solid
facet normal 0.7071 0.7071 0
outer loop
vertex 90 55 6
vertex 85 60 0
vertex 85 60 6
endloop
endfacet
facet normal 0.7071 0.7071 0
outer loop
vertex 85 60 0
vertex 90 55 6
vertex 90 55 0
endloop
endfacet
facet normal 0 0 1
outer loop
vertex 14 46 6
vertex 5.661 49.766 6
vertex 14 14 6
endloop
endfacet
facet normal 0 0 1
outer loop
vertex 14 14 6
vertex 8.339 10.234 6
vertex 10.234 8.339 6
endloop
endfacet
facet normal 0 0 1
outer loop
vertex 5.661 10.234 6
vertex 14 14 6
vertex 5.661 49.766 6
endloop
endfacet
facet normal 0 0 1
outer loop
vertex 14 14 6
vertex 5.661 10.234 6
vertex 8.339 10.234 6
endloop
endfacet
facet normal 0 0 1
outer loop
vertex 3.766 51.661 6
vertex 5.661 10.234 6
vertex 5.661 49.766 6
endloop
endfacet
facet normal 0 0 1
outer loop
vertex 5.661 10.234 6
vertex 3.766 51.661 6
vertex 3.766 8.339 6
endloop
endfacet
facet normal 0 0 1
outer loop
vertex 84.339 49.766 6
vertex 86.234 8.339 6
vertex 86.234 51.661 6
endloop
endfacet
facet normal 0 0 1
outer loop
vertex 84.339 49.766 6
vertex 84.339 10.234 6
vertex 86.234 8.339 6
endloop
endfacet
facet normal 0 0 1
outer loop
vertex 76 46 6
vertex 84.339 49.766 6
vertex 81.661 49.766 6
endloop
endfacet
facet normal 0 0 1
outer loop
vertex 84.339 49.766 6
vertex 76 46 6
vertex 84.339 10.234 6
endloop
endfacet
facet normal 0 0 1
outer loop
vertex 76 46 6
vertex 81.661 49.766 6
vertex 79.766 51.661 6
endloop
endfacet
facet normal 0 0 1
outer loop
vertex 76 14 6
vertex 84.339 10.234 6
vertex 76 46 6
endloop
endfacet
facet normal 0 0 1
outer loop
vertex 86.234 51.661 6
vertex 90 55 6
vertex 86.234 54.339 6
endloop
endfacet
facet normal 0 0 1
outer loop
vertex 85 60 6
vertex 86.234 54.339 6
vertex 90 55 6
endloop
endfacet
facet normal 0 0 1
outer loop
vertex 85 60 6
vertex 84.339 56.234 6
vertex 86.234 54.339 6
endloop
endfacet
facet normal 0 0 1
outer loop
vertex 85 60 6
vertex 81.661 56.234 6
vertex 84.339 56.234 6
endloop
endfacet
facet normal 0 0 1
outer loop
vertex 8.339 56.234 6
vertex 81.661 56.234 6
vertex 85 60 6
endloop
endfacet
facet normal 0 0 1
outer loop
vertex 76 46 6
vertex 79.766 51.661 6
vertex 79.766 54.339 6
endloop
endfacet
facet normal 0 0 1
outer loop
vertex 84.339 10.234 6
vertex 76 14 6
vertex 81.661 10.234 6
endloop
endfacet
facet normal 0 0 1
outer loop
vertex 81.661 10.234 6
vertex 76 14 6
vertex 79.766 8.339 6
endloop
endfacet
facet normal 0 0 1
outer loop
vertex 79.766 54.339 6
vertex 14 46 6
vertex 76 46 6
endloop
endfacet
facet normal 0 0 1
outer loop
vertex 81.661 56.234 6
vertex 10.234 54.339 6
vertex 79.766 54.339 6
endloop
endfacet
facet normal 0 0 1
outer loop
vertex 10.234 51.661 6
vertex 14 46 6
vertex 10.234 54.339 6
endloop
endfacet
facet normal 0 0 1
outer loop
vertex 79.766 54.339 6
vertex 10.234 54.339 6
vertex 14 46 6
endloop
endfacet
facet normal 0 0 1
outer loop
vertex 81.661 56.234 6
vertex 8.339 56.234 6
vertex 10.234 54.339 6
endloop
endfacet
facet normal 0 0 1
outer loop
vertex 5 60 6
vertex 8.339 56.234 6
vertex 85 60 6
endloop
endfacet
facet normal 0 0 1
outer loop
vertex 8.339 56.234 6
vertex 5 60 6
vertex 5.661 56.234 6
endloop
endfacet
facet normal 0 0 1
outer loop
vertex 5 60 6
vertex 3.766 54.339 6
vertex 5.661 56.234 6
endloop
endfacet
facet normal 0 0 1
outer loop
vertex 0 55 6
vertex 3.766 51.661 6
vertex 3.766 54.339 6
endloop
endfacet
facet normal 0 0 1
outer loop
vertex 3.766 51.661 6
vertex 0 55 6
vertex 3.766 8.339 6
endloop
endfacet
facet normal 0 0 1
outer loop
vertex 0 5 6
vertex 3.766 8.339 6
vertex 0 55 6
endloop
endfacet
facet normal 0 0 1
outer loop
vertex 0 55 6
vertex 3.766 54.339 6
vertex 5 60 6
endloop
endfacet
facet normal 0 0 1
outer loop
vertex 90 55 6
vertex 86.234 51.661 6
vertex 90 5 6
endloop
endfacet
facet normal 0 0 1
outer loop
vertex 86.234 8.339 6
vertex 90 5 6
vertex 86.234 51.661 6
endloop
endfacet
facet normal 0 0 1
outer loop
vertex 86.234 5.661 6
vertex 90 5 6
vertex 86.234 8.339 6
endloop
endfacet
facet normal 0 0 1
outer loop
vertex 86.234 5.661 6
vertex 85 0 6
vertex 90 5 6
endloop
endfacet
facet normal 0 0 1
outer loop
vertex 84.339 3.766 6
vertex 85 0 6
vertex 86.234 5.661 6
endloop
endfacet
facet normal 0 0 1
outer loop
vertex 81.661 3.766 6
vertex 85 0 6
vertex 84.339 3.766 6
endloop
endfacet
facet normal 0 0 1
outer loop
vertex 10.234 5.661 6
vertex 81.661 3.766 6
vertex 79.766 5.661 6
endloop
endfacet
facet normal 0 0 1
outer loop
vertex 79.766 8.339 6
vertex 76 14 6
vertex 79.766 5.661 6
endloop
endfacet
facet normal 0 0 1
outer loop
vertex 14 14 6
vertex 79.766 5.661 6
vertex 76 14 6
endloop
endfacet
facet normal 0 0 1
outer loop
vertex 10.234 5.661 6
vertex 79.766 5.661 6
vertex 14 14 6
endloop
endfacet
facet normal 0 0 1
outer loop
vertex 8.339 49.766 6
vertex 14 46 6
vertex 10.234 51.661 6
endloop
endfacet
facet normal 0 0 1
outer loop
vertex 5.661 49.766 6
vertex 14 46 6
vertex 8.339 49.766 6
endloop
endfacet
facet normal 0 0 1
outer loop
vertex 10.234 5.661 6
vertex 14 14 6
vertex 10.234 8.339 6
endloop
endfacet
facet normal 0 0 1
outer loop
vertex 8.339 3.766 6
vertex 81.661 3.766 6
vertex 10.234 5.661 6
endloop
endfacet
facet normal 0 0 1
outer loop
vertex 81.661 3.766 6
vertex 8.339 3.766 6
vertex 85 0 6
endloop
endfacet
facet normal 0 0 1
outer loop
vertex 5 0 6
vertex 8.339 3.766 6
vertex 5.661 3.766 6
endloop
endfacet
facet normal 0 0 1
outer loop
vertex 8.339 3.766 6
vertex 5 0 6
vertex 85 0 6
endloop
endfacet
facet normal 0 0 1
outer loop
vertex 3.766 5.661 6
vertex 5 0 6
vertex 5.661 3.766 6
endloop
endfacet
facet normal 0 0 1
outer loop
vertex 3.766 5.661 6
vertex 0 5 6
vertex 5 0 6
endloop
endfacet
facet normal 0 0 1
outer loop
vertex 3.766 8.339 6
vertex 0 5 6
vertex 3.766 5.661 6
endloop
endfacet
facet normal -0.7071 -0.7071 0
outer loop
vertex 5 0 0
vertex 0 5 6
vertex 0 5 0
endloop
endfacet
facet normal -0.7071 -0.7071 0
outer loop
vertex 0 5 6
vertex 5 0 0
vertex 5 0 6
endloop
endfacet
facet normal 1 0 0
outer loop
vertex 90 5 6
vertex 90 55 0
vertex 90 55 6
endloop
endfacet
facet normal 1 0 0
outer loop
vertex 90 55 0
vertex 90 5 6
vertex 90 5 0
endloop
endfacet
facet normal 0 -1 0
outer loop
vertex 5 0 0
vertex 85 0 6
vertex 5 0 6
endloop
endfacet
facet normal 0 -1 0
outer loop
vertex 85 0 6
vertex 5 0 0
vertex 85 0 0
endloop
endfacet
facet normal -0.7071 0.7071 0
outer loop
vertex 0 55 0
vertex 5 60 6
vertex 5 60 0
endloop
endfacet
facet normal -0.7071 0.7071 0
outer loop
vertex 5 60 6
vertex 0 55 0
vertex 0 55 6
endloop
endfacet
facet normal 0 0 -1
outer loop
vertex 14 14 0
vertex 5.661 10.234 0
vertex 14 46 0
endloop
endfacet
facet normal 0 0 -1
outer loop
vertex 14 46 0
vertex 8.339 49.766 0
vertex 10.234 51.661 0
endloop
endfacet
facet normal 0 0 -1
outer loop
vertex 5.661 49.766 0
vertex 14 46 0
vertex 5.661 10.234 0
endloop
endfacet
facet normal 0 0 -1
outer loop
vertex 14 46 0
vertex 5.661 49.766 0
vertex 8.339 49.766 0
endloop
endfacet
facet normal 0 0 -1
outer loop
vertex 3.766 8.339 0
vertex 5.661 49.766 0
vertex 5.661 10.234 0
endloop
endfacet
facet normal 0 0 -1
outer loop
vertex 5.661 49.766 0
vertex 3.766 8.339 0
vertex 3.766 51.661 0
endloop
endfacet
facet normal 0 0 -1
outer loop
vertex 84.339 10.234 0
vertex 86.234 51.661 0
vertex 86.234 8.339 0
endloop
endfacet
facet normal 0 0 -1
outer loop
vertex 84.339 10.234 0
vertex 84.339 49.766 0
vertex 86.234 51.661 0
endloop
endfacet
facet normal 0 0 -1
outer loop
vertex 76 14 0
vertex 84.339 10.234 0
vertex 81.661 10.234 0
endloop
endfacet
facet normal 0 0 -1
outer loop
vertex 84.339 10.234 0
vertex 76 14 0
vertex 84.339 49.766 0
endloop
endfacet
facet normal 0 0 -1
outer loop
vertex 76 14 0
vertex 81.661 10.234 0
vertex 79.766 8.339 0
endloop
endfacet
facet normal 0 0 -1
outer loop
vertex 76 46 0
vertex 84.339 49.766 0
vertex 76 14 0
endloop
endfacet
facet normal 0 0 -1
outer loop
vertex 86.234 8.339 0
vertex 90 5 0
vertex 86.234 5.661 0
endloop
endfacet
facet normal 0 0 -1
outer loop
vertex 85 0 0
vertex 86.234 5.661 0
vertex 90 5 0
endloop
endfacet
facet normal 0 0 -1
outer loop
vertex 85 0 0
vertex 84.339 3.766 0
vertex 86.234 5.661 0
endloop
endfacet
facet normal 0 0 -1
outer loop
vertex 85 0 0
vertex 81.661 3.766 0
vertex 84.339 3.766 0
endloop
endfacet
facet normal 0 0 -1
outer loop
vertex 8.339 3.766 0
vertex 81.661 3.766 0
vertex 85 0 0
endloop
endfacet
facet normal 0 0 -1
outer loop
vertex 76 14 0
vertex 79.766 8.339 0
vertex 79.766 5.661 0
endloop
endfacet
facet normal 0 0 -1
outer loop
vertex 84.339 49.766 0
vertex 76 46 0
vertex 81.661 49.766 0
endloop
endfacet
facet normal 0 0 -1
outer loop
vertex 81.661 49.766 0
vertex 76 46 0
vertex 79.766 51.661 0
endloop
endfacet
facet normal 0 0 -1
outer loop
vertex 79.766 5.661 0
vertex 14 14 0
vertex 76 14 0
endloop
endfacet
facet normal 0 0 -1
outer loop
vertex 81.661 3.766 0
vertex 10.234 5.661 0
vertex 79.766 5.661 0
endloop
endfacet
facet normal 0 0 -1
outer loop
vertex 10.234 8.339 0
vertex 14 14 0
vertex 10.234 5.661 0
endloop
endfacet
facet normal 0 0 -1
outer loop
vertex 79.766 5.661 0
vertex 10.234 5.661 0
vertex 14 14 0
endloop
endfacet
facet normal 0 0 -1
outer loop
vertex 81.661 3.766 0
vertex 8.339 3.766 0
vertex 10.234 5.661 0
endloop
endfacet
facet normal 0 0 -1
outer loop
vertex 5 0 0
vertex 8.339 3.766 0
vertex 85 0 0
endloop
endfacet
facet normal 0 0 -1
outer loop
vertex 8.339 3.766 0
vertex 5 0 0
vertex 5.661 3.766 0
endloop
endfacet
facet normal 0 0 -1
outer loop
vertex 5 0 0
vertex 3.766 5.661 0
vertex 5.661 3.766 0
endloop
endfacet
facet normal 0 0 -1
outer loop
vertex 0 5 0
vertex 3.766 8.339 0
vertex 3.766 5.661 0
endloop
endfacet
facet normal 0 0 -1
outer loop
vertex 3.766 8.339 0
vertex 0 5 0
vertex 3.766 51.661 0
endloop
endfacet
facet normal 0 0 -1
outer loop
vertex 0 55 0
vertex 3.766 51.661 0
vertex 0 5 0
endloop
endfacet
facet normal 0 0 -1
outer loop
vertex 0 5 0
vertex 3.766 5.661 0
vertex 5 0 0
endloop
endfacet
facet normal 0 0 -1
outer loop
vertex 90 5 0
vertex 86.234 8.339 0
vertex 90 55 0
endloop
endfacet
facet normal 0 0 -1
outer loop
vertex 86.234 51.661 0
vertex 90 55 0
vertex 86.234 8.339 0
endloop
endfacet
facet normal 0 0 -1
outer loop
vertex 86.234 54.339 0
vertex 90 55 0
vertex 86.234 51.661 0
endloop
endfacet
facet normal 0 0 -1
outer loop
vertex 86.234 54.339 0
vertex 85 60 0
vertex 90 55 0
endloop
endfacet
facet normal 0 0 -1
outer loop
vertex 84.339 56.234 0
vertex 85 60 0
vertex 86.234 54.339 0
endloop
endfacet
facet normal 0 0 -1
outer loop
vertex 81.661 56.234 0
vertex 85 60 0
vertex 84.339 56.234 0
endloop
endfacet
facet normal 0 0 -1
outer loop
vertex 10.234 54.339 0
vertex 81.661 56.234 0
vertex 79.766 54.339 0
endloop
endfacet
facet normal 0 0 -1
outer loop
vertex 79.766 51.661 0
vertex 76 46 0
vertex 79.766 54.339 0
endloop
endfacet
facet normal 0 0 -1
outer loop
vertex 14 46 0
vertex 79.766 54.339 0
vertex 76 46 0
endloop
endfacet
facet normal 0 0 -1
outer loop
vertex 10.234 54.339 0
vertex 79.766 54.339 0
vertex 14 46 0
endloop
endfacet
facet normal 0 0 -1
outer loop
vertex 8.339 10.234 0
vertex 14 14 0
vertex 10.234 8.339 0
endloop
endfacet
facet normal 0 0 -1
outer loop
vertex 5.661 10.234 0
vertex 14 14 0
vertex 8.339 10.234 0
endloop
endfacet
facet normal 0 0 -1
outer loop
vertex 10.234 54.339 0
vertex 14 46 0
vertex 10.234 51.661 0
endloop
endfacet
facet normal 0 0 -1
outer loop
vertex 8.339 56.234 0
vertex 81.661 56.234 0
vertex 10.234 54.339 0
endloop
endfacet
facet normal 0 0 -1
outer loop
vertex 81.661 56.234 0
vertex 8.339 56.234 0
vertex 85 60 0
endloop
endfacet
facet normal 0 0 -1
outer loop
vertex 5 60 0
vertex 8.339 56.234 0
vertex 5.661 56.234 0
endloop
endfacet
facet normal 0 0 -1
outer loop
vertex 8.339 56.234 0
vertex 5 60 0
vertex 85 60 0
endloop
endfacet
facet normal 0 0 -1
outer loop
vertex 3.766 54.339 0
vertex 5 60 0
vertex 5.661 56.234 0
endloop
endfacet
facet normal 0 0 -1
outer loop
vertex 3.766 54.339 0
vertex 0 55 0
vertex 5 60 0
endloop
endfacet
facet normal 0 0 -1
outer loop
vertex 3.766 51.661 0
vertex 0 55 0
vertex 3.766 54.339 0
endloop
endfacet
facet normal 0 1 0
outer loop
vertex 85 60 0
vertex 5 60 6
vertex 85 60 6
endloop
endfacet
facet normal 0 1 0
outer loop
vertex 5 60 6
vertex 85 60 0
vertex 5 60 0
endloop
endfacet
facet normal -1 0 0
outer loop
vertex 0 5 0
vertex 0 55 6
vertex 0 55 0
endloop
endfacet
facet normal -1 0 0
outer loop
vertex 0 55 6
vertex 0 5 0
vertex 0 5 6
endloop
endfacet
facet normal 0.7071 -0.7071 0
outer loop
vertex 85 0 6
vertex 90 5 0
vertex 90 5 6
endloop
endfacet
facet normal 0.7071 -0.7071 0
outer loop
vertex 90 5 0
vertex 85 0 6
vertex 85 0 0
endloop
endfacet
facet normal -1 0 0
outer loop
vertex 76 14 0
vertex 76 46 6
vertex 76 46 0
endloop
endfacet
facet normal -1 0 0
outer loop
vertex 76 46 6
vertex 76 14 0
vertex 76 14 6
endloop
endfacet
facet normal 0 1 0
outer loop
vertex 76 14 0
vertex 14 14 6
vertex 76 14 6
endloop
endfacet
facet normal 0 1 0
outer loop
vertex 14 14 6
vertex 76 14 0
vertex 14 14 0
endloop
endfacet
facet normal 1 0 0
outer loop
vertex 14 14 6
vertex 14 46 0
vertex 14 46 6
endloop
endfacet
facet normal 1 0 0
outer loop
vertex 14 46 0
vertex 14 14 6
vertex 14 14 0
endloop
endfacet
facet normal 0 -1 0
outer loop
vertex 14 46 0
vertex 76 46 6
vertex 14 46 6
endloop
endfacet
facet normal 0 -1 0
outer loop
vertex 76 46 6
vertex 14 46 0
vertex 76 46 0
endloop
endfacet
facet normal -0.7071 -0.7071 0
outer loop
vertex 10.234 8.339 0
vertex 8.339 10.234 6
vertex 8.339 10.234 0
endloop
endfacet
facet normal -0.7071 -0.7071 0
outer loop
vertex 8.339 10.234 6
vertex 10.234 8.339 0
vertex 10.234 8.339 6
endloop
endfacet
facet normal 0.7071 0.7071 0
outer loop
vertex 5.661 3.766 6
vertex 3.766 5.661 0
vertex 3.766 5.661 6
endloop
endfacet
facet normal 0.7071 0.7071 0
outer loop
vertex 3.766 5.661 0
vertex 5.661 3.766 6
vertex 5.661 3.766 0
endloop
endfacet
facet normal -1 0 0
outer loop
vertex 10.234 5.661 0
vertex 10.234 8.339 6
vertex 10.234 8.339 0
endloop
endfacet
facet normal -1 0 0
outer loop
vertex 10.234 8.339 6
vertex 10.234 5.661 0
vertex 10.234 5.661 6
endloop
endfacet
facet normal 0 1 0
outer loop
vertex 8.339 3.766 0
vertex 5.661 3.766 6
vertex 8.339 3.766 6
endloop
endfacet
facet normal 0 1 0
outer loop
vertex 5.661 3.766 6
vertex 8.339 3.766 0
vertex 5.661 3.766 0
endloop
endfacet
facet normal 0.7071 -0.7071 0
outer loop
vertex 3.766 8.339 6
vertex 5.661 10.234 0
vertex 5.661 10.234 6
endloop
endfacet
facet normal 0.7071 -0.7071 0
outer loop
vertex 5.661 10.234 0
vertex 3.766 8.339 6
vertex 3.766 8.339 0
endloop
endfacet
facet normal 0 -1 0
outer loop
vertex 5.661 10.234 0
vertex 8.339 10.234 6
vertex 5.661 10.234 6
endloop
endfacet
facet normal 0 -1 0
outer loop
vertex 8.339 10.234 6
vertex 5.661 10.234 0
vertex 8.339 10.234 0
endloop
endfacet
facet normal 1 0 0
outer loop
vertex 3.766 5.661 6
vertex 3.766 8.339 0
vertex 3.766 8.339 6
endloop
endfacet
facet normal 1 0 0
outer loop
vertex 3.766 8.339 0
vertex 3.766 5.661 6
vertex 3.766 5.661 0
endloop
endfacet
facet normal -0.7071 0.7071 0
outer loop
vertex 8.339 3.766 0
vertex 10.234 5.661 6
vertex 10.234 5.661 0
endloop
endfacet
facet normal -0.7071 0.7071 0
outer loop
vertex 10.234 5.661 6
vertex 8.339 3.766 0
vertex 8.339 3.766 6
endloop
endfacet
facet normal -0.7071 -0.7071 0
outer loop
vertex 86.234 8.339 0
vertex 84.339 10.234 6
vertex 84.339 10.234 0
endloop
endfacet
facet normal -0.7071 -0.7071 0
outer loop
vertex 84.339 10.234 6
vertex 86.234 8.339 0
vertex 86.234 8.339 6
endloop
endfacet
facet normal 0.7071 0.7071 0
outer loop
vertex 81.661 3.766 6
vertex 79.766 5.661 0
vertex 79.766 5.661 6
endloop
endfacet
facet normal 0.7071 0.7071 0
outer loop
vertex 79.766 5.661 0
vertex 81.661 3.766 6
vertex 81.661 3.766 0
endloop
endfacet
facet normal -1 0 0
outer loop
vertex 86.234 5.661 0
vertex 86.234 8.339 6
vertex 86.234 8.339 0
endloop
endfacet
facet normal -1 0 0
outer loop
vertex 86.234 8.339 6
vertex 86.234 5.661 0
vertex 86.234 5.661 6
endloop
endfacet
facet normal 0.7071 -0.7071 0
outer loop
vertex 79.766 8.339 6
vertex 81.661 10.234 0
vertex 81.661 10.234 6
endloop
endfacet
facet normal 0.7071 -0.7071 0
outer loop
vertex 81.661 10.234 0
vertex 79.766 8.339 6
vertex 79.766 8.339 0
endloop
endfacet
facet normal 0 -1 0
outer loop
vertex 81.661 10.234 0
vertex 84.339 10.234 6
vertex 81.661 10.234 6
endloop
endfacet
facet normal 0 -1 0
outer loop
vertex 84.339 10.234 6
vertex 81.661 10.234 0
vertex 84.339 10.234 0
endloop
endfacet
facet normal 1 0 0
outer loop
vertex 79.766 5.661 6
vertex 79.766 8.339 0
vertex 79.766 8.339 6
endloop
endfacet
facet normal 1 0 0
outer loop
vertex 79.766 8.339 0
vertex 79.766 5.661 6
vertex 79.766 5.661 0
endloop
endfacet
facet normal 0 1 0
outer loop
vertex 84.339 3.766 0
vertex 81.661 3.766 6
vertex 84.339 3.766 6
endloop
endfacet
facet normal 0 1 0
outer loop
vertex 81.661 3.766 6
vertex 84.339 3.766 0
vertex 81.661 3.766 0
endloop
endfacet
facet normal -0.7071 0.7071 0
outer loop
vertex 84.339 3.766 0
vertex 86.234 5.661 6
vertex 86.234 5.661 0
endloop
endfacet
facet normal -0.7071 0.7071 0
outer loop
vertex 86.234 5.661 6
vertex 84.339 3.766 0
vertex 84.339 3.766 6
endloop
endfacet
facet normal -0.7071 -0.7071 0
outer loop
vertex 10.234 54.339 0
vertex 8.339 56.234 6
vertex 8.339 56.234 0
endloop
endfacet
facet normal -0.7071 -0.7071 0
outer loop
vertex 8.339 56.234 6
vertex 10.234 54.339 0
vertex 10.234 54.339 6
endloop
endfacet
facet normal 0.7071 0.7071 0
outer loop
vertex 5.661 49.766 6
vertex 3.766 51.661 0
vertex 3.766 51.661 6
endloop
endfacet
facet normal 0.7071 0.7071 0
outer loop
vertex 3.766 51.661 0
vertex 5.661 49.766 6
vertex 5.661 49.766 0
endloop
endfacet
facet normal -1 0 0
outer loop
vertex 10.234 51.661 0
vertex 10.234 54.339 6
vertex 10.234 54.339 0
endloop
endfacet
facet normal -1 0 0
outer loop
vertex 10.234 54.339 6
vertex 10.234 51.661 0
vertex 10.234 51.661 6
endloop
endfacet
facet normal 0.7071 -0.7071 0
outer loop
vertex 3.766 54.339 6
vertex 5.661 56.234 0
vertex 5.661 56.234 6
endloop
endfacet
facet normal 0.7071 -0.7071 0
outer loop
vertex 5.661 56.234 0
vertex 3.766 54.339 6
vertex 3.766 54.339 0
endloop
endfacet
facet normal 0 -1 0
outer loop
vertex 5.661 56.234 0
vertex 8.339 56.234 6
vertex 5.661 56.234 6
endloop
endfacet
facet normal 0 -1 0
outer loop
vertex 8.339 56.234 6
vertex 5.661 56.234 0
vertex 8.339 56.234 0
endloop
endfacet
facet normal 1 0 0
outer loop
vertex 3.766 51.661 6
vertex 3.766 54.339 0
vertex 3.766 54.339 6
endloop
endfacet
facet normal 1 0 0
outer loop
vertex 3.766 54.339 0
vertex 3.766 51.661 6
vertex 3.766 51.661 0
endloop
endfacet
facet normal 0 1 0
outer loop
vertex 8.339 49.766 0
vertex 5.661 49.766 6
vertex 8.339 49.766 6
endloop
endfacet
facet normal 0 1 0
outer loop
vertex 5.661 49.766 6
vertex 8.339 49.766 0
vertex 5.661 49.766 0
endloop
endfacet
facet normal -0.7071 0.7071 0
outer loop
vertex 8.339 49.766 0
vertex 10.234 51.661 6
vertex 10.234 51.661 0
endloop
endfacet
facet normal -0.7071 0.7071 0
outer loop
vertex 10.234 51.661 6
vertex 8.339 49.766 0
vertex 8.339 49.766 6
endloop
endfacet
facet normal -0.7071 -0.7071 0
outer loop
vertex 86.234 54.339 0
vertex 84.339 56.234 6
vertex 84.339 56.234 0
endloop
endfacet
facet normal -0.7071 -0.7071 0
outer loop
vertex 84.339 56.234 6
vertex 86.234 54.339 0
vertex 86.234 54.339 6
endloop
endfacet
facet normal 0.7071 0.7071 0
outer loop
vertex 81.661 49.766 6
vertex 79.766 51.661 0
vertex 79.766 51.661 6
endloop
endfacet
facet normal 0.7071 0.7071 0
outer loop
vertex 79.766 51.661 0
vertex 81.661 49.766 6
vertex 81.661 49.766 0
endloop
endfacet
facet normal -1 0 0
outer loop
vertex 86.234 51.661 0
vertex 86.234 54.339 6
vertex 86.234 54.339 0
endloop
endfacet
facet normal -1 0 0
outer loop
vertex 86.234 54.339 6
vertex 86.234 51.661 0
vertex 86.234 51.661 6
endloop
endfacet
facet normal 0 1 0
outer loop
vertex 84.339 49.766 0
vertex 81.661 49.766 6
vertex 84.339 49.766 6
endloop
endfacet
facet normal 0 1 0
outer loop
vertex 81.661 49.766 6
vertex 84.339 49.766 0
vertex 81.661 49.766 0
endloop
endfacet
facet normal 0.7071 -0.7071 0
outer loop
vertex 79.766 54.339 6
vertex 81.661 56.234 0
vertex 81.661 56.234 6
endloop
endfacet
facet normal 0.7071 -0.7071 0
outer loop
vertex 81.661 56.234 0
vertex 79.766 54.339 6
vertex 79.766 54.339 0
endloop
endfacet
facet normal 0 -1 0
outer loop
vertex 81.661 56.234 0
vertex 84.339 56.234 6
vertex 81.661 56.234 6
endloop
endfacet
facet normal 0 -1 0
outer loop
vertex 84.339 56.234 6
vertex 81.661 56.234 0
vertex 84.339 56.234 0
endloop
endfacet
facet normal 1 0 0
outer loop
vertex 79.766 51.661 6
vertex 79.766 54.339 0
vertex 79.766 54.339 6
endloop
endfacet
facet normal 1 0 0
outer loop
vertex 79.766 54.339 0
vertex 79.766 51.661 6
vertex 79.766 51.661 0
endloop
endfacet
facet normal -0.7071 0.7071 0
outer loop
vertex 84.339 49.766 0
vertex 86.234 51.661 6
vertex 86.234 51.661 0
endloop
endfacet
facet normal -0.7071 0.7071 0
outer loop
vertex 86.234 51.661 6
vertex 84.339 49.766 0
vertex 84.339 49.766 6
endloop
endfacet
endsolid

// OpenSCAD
$fn = 32;

// ----------------------------------------------------------------------
// Frame plate: 90 x 60 frame, 14 mm rails
// ----------------------------------------------------------------------

// --- parameters (mm) ---
plate_l = 90;             // plate length, X
plate_w = 60;             // plate width, Y
plate_t = 6;              // plate thickness, Z (extrusion height)
corner_c = 5;             // corner chamfer
frame_bar = 14;           // frame rail width
bolt_r = 3.5;             // corner bolt window radius
bolt_inset = 7;           // bolt centre inset from the edges
fit_tol = 0.05;           // declared fit tolerance (prompt contract)
free_tol = 0.3;           // declared free tolerance (prompt contract)

win_l = plate_l - 2 * frame_bar;  // window length
win_w = plate_w - 2 * frame_bar;  // window width
bolt_d = 2 * bolt_r;  // corner hole diameter

profile = [[5, 0], [85, 0], [90, 5], [90, 55], [85, 60], [5, 60], [0, 55], [0, 5]];  // primary outline, 8 points, counter clockwise
void_1 = [[14, 14], [76, 14], [76, 46], [14, 46]];  // the window, 4 points
void_2 = [[10.234, 8.339], [8.339, 10.234], [5.661, 10.234], [3.766, 8.339], [3.766, 5.661], [5.661, 3.766], [8.339, 3.766], [10.234, 5.661]];  // corner bolt window, 8 points
void_3 = [[86.234, 8.339], [84.339, 10.234], [81.661, 10.234], [79.766, 8.339], [79.766, 5.661], [81.661, 3.766], [84.339, 3.766], [86.234, 5.661]];  // corner bolt window, 8 points
void_4 = [[10.234, 54.339], [8.339, 56.234], [5.661, 56.234], [3.766, 54.339], [3.766, 51.661], [5.661, 49.766], [8.339, 49.766], [10.234, 51.661]];  // corner bolt window, 8 points
void_5 = [[86.234, 54.339], [84.339, 56.234], [81.661, 56.234], [79.766, 54.339], [79.766, 51.661], [81.661, 49.766], [84.339, 49.766], [86.234, 51.661]];  // corner bolt window, 8 points

// --- the one profile operation ---
difference() {
  linear_extrude(height = plate_t) polygon(points = profile);
  translate([0, 0, -1])
    linear_extrude(height = plate_t + 2) polygon(points = void_1);
  translate([0, 0, -1])
    linear_extrude(height = plate_t + 2) polygon(points = void_2);
  translate([0, 0, -1])
    linear_extrude(height = plate_t + 2) polygon(points = void_3);
  translate([0, 0, -1])
    linear_extrude(height = plate_t + 2) polygon(points = void_4);
  translate([0, 0, -1])
    linear_extrude(height = plate_t + 2) polygon(points = void_5);
}
